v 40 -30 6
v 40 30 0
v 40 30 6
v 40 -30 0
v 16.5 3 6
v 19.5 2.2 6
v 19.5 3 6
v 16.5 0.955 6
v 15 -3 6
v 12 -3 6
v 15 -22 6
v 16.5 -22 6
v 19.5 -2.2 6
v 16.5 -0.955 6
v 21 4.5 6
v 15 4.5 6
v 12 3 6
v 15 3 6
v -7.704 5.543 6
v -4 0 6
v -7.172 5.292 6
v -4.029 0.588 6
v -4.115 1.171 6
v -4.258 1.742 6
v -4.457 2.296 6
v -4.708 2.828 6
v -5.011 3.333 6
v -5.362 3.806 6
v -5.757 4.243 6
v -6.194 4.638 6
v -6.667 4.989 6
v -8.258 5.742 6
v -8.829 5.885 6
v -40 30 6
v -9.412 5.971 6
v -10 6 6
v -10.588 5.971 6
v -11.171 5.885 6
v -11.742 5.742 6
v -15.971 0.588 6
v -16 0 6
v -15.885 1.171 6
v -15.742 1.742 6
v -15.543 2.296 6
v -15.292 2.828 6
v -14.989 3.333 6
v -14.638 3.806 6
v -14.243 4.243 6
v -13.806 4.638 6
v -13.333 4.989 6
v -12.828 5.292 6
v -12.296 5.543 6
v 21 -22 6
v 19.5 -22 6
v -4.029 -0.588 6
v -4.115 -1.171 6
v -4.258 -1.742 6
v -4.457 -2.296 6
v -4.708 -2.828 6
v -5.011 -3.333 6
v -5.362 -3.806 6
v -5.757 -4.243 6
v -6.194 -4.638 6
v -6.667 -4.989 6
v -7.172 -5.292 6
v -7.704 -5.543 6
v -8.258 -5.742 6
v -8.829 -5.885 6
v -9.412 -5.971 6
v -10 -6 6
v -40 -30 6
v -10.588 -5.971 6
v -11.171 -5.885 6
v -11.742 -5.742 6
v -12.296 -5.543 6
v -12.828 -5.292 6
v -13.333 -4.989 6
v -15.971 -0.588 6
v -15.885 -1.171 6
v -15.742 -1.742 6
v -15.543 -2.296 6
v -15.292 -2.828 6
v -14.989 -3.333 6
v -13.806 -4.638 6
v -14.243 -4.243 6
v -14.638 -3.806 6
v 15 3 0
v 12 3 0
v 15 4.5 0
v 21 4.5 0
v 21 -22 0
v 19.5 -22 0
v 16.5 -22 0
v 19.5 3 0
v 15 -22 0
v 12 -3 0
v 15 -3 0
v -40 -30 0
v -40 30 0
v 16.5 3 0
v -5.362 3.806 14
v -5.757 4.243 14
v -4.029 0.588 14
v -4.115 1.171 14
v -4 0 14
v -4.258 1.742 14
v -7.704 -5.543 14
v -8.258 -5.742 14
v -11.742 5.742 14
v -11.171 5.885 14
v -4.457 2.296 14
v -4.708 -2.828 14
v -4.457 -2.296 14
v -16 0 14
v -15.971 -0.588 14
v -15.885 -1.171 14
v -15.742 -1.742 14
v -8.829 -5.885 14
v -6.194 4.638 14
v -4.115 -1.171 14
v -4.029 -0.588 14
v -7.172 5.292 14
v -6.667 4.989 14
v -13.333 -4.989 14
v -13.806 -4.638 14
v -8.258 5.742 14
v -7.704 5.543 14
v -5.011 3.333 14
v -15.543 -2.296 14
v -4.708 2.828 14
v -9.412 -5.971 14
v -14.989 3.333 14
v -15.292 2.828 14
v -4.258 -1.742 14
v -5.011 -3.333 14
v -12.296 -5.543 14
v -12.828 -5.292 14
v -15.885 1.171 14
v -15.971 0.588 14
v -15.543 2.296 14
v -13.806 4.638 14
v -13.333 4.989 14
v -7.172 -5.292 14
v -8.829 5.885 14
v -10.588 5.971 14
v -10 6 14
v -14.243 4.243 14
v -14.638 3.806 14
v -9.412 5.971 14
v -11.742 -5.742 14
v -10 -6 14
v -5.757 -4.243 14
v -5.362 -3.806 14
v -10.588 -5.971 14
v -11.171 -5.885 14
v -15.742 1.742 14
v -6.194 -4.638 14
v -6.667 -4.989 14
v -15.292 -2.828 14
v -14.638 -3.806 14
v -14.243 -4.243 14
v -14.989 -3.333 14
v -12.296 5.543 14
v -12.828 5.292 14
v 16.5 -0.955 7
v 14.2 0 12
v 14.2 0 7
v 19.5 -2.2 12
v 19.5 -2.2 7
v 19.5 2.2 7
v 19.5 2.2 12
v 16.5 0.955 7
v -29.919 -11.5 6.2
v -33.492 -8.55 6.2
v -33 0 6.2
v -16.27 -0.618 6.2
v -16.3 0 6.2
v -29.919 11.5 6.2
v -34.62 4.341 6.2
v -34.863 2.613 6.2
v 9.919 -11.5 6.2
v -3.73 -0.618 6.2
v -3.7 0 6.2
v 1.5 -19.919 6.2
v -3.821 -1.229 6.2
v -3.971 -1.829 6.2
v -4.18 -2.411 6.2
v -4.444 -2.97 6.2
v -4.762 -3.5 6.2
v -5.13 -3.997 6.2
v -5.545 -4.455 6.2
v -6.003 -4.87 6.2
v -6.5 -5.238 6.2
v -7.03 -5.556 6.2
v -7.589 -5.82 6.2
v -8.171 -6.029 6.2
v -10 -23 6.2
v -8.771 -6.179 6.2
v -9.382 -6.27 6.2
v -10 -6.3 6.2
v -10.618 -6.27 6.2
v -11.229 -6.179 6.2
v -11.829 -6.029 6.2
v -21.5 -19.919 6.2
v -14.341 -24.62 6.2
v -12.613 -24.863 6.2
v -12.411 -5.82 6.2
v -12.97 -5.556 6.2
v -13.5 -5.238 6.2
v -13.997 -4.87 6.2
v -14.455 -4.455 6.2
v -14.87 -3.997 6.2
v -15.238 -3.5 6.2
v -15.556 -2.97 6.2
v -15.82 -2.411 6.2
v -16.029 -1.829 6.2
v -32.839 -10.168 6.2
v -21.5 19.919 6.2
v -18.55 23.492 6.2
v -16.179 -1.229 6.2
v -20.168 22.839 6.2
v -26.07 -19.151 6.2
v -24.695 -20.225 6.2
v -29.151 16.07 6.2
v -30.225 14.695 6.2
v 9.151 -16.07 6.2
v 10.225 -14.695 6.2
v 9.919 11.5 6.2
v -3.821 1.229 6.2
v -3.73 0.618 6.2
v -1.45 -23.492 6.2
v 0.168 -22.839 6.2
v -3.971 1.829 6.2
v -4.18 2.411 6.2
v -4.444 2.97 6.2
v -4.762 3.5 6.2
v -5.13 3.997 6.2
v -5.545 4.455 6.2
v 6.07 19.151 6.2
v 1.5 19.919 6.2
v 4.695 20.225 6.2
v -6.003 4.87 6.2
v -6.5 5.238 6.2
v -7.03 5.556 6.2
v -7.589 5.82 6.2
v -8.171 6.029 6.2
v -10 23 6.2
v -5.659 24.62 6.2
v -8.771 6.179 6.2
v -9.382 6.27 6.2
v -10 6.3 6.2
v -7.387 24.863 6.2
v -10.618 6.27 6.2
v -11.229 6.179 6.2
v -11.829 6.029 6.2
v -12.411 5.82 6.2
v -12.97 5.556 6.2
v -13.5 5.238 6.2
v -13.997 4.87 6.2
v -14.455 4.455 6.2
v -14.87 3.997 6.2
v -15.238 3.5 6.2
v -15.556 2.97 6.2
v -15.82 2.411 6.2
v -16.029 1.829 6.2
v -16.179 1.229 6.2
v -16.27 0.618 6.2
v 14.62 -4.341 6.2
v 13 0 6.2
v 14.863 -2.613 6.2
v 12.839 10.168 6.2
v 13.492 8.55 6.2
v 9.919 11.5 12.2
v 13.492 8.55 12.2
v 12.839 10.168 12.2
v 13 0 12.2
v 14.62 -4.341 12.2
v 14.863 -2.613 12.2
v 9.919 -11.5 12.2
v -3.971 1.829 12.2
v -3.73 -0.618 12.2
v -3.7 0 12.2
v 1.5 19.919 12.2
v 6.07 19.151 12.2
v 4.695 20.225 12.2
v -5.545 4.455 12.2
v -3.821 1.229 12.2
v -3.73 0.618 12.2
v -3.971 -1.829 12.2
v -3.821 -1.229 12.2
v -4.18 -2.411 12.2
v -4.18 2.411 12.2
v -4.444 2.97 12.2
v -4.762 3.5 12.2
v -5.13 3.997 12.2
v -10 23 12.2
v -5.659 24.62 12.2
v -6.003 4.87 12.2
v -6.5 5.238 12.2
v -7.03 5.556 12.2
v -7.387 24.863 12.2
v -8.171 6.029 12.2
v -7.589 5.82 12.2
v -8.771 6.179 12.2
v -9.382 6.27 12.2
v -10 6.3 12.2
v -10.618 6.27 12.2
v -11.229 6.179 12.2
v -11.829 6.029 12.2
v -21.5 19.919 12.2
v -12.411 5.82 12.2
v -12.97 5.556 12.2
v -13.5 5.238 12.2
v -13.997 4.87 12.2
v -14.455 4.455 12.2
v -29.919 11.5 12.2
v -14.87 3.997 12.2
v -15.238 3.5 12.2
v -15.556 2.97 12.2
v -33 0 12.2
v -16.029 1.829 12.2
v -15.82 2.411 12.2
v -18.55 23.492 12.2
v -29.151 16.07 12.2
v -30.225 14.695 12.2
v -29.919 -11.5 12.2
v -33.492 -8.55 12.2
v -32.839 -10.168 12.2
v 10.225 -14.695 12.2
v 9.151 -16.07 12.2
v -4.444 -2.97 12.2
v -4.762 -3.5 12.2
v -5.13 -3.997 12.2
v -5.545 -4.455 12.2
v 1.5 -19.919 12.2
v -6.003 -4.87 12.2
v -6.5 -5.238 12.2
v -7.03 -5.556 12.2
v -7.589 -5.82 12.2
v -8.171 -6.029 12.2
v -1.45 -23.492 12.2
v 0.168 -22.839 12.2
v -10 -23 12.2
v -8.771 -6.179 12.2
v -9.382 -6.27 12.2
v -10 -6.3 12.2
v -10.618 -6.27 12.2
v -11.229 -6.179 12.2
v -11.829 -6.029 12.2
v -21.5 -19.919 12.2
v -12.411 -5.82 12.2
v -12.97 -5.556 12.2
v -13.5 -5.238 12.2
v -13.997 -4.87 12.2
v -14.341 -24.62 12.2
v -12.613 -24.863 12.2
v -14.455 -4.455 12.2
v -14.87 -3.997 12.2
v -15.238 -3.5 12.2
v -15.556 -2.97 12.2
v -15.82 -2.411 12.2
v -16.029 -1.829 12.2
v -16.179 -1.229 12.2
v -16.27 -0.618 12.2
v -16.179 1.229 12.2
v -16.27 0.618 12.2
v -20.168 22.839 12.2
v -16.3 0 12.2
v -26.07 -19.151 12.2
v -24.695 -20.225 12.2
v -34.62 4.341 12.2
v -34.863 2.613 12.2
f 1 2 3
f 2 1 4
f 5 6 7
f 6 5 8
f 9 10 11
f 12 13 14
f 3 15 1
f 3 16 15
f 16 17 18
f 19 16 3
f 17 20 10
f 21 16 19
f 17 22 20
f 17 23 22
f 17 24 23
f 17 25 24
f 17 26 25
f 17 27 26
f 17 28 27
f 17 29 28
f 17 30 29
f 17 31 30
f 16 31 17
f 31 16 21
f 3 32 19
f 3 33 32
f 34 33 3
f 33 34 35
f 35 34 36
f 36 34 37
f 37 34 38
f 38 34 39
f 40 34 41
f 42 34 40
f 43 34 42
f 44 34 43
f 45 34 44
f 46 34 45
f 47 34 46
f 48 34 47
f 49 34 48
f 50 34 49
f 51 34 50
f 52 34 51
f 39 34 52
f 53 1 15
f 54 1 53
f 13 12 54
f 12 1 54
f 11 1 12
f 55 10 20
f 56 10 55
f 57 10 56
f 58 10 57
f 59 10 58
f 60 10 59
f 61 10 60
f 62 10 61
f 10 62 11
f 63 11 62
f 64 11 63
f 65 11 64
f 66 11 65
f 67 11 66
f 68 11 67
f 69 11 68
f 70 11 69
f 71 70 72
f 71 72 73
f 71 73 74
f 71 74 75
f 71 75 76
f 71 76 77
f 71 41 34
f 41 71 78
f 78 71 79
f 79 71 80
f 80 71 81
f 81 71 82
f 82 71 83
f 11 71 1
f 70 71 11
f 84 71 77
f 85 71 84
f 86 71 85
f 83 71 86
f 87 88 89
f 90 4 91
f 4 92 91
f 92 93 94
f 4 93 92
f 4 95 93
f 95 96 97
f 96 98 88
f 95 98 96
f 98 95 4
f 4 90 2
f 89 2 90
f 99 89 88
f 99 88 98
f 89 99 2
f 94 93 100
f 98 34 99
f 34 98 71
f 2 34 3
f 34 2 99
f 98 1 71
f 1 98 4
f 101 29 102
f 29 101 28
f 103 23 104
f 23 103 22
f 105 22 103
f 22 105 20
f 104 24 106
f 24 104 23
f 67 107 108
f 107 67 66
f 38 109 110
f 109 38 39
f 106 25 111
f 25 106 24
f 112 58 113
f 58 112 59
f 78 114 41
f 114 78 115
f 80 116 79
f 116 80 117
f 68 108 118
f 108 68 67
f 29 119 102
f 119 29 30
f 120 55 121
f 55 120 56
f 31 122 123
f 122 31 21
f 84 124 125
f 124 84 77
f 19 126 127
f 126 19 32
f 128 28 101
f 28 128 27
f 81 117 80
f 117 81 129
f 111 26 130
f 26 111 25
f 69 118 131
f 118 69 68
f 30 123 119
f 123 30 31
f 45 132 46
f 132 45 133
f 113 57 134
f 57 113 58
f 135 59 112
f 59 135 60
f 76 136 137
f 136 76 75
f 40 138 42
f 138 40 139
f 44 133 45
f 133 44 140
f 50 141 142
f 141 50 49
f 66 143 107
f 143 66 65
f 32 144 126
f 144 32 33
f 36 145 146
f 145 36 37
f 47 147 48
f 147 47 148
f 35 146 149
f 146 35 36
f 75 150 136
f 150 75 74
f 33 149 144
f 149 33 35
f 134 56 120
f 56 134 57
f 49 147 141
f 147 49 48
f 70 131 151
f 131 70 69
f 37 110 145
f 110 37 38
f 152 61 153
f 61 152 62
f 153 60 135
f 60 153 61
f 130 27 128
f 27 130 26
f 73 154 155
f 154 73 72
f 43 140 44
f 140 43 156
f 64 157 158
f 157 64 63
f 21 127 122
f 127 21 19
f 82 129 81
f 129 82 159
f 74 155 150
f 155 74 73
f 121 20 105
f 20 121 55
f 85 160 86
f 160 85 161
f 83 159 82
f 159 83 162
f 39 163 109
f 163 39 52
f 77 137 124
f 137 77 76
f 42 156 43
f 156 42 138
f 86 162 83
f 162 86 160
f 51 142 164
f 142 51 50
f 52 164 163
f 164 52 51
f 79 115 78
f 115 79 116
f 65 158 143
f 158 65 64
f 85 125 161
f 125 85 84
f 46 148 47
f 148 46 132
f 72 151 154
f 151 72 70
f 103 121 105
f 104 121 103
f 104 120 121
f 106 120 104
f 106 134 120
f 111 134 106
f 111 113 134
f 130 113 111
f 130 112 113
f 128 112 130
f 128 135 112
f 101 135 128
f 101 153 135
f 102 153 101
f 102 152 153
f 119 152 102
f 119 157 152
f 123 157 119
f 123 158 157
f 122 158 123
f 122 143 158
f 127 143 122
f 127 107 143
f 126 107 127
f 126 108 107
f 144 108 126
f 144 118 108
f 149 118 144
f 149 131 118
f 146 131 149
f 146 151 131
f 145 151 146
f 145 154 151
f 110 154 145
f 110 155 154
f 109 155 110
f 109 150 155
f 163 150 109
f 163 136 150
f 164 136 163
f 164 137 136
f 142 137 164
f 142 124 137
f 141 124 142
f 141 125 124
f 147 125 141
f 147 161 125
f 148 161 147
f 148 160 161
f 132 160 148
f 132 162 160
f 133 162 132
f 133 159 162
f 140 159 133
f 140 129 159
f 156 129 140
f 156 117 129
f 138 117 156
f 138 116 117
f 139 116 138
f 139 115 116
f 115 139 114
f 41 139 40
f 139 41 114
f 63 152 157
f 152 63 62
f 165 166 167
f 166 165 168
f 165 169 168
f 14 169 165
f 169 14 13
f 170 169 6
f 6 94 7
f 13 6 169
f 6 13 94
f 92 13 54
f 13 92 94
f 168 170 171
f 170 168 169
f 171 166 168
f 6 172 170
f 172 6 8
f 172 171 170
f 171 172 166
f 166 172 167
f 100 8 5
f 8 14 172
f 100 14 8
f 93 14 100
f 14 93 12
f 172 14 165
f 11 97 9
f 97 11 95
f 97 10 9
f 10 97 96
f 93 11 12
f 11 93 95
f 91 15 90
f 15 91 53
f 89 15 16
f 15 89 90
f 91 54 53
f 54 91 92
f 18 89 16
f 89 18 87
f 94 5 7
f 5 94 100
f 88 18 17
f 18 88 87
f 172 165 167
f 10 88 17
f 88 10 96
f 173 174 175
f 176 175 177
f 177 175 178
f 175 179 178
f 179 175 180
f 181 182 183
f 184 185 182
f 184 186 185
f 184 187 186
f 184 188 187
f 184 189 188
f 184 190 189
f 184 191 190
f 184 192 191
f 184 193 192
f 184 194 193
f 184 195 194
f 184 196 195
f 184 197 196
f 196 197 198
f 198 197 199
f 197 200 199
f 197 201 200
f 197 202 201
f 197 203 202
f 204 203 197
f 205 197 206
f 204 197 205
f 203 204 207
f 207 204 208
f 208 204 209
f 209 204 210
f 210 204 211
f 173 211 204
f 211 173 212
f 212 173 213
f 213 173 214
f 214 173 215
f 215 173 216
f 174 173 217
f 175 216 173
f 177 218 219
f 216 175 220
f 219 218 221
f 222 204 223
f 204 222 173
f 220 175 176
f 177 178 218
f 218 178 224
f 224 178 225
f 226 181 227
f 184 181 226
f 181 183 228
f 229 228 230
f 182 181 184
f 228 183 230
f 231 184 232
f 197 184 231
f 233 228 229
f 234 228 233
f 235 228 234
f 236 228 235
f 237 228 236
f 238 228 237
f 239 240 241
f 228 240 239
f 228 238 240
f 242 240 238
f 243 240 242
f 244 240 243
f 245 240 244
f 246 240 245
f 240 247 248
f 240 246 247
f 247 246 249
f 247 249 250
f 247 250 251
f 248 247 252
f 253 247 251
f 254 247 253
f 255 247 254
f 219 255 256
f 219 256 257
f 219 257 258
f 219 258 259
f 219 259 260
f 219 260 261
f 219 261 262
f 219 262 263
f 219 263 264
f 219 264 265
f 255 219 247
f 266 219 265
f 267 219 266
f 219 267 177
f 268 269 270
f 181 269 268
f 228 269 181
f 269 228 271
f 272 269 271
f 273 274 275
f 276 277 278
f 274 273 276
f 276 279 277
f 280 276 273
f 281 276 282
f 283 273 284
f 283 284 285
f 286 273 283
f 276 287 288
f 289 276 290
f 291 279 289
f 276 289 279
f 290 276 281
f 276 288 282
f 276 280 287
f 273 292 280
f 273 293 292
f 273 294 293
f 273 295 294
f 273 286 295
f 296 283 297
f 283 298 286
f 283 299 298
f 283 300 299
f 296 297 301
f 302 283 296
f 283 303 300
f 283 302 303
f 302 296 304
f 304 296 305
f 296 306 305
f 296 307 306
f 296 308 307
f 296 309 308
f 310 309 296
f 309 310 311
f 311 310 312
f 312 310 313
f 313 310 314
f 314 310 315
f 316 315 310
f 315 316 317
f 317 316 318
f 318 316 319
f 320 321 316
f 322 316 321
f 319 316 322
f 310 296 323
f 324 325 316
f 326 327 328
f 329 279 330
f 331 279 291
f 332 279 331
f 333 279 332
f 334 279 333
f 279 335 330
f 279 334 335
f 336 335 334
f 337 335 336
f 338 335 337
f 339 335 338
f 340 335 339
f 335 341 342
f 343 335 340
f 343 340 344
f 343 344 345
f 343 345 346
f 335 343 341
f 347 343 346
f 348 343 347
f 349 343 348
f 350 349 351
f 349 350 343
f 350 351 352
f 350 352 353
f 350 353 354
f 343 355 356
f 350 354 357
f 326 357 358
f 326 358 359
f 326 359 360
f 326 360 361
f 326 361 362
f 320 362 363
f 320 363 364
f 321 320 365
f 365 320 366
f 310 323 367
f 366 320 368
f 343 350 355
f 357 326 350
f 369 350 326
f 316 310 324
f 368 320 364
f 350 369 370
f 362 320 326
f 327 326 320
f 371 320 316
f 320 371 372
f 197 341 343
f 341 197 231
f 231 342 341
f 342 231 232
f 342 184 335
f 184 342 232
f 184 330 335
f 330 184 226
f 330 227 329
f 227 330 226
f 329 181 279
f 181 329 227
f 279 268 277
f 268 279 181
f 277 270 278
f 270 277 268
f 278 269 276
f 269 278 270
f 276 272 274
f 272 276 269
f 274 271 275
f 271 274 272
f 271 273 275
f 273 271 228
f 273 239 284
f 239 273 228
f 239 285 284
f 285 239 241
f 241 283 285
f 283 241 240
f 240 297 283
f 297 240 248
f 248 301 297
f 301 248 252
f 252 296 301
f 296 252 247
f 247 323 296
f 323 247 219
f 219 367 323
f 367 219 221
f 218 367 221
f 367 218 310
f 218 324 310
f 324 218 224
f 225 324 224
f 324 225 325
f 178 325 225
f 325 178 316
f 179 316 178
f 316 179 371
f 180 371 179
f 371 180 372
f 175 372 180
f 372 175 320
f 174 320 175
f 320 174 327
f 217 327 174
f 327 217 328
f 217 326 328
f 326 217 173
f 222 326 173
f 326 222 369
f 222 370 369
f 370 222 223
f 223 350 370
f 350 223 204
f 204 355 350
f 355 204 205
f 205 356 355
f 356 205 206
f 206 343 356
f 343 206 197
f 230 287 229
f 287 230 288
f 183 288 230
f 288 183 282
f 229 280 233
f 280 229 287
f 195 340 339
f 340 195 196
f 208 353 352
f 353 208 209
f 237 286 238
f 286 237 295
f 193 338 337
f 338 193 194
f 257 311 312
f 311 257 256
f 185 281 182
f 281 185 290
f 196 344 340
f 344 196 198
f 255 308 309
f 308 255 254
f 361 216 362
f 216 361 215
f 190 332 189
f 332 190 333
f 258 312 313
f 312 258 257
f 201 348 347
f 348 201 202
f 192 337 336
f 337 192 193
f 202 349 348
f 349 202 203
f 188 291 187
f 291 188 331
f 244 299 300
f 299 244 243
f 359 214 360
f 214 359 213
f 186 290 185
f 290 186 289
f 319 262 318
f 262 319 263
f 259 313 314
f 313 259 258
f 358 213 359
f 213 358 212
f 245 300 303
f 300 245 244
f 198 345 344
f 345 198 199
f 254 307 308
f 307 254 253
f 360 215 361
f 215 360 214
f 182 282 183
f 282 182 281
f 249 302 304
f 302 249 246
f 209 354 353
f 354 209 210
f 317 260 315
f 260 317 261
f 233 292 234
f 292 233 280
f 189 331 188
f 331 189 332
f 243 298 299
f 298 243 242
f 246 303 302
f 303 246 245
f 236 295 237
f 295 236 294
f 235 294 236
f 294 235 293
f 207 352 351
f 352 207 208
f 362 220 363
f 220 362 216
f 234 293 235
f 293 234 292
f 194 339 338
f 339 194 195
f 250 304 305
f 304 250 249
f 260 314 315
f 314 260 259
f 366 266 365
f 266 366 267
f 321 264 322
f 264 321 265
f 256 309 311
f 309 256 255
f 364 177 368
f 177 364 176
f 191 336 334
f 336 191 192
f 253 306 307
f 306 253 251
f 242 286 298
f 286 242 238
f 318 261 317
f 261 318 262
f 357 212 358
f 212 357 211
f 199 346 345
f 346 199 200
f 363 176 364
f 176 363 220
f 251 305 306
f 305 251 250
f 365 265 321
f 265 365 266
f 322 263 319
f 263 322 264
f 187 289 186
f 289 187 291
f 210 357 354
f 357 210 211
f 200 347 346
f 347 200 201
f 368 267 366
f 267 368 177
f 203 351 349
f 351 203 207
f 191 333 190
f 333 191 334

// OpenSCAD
/* Ratchet wheel with spring pawl - desk demo, PLA, 0.4 mm nozzle, no supports.
   Wheel (~50 mm, 12 teeth) turns on a post; the pawl is part of the base on a
   flexible arm cut from the plate. Free way is clockwise seen from above
   (negative rotation about +Z). */
part = "assembly"; // [wheel:Wheel, base:Base, assembly:Assembly]

cadverify_only = "";
module instance(name, part, unit = 1) {
    echo(cadverify_instance = [name, part, unit]);
    if (cadverify_only == "" || cadverify_only == name) children();
}

// ---------- parameters (mm) ----------
Rtip = 25;          // wheel outer radius (50 mm across)
Rroot = 23;         // wheel root radius (tooth height 2 mm)
wheel_t = 6;        // wheel thickness
hole_D = 12.6;      // wheel centre hole diameter
post_D = 12;        // base post diameter (0.6 mm play on diameter)
post_h = 8;         // post height above base top
base_t = 6;         // base plate thickness
base_x = 80;
base_y = 60;
wheel_cx = -10;     // wheel centre in base/assembly XY
wheel_cy = 0;
wheel_gap = 0.2;    // wheel bottom above base top
wheel_lift_z = base_t + wheel_gap;   // 6.2 wheel bottom in assembly
post_top_z = base_t + post_h;        // 14
pawl_tip_x = 14.2;  // pawl tip: 0.8 inside tip circle, 1.2 off root
beam_x0 = 16.5; beam_x1 = 19.5;      // flexible arm: 3 mm wide ...
beam_y0 = -22; beam_y1 = 3;          // ... 25 mm long, fixed south, free north
slot_w = 1.5;       // slot width (clears a 0.4 mm nozzle)
pawl_h = 6;         // pawl height above plate (meets wheel band 6.2..12.2)
rest_angle = 0;     // gullet bottom centred on pawl tip

// tooth k: root at 30k, shallow rise to tip at 30k+20, tip land to +24, steep drop to root
function wheel_pts() = [
    for(k=[0:11]) for(j=[0:2])
        j==0 ? [Rroot*cos(k*30), Rroot*sin(k*30)]
      : j==1 ? [Rtip*cos(k*30+20), Rtip*sin(k*30+20)]
             : [Rtip*cos(k*30+24), Rtip*sin(k*30+24)]
];

module wheel() {
    difference() {
        linear_extrude(height=wheel_t, convexity=4)
            polygon(points=wheel_pts());
        translate([0,0,-1]) cylinder(d=hole_D, h=wheel_t+2, $fn=64);
    }
}

module base() {
    difference() {
        union() {
            // plate
            translate([-base_x/2, -base_y/2, 0]) cube([base_x, base_y, base_t]);
            // post the wheel turns on
            translate([wheel_cx, wheel_cy, base_t]) cylinder(d=post_D, h=post_h, $fn=64);
            // pawl wedge: tip near the wheel, root fused onto the free end of the arm
            translate([0,0,base_t]) linear_extrude(height=pawl_h, convexity=2)
                polygon(points=[[pawl_tip_x, 0],[beam_x1, 2.2],[beam_x1, -2.2]]);
        }
        // U-slot freeing the arm (one connected through opening) + window under pawl tip
        translate([beam_x0-slot_w, beam_y0, -1]) cube([slot_w, 19, base_t+2]); // west x15..16.5 y-22..-3
        translate([beam_x1, beam_y0, -1]) cube([slot_w, 26.5, base_t+2]);      // east x19.5..21 y-22..4.5
        translate([beam_x0-slot_w, beam_y1, -1]) cube([6, slot_w, base_t+2]);  // north x15..21 y3..4.5
        translate([12, -3, -1]) cube([4.5, 6, base_t+2]);                       // window x12..16.5 y-3..3
    }
}

module assembly() {
    instance("base_inst", "base", 1) base();
    instance("wheel_inst", "wheel", 1)
        translate([wheel_cx, wheel_cy, wheel_lift_z]) rotate([0,0,rest_angle]) wheel();
}

// ---------- specs (computed from parameters) ----------
wheel_spec = [
    ["bounds", [[-Rtip, -Rtip, 0], [Rtip, Rtip, wheel_t]]],
    ["bodies", 1],
    ["through_holes", 1],
    ["support_faces", [["bed", "-z", 800]]],
    ["overhangs_allowed", []],
    ["copies", 1],
    ["details", [
        ["axle_hole", "hole", [0, 0, wheel_t+4], [0, 0, -1], [[0, hole_D], [wheel_t, hole_D]]],
        ["rim_thick", "thickness", [15, 0, wheel_t+4], [0, 0, -1], wheel_t],
        ["tooth0", "material", [[21.75, 8.49, 0], [22.75, 9.49, wheel_t]], 0.5],
        ["tooth4", "material", [[-19.41, 14.30, 0], [-18.41, 15.30, wheel_t]], 0.5],
        ["tooth8", "material", [[-3.84, -24.27, 0], [-2.84, -23.27, wheel_t]], 0.5]
    ]]
];

base_spec = [
    ["bounds", [[-base_x/2, -base_y/2, 0], [base_x/2, base_y/2, post_top_z]]],
    ["bodies", 1],
    ["through_holes", 1],
    ["support_faces", [["bed", "-z", 2000]]],
    ["overhangs_allowed", [["pawl bridges slot", [[14, -1.5, 5.9], [17, 1.5, 6.1]]]]],
    ["copies", 1],
    ["details", [
        ["plate_thick", "thickness", [0, -28, base_t+4], [0, 0, -1], base_t],
        ["post_dia", "thickness", [wheel_cx-10, wheel_cy, base_t+post_h-1], [1, 0, 0], post_D],
        ["post_core", "material", [[wheel_cx-2, -2, 8], [wheel_cx+2, 2, 13]], 0.8],
        ["arm_block", "thickness", [14, -16, 3], [1, 0, 0], beam_x1-beam_x0],
        ["arm_full", "material", [[17, -20, 0], [19, -12, base_t]], 0.8],
        ["slot_gap", "void", [[beam_x0-slot_w, -20, 0], [beam_x0, -10, base_t]], 0.8],
        ["window_void", "void", [[12.5, -2.5, 0], [16, 2.5, base_t]], 0.8],
        ["pawl_tip", "material", [[14.9, -0.2, 8], [15.7, 0.2, 11]], 0.5],
        ["pawl_height", "thickness", [14.5, 0, base_t+pawl_h+3], [0, 0, -1], pawl_h]
    ]]
];

assembly_spec = [
    ["bounds", [[-base_x/2, -base_y/2, 0], [base_x/2, base_y/2, post_top_z]]],
    ["support_faces", [["desk", "-z", 2000]]],
    ["allowed_interferences", []],
    ["motions", [
        ["spin_free", ["wheel_inst"], "rotate", [wheel_cx, wheel_cy, wheel_lift_z], [0, 0, 1], [0, -360],
            ["flex", [["wheel_inst", "base_inst", 0.9, "pawl clicks over teeth"]]]]
    ]],
    ["assembly_order", [
        [["base_inst"], [0, 0, 0]],
        [["wheel_inst"], [0, 0, -1]]
    ]]
];

if (part == "wheel") {
    echo(cadverify_spec = wheel_spec);
    wheel();
} else if (part == "base") {
    echo(cadverify_spec = base_spec);
    base();
} else {
    echo(cadverify_spec = assembly_spec);
    assembly();
}
